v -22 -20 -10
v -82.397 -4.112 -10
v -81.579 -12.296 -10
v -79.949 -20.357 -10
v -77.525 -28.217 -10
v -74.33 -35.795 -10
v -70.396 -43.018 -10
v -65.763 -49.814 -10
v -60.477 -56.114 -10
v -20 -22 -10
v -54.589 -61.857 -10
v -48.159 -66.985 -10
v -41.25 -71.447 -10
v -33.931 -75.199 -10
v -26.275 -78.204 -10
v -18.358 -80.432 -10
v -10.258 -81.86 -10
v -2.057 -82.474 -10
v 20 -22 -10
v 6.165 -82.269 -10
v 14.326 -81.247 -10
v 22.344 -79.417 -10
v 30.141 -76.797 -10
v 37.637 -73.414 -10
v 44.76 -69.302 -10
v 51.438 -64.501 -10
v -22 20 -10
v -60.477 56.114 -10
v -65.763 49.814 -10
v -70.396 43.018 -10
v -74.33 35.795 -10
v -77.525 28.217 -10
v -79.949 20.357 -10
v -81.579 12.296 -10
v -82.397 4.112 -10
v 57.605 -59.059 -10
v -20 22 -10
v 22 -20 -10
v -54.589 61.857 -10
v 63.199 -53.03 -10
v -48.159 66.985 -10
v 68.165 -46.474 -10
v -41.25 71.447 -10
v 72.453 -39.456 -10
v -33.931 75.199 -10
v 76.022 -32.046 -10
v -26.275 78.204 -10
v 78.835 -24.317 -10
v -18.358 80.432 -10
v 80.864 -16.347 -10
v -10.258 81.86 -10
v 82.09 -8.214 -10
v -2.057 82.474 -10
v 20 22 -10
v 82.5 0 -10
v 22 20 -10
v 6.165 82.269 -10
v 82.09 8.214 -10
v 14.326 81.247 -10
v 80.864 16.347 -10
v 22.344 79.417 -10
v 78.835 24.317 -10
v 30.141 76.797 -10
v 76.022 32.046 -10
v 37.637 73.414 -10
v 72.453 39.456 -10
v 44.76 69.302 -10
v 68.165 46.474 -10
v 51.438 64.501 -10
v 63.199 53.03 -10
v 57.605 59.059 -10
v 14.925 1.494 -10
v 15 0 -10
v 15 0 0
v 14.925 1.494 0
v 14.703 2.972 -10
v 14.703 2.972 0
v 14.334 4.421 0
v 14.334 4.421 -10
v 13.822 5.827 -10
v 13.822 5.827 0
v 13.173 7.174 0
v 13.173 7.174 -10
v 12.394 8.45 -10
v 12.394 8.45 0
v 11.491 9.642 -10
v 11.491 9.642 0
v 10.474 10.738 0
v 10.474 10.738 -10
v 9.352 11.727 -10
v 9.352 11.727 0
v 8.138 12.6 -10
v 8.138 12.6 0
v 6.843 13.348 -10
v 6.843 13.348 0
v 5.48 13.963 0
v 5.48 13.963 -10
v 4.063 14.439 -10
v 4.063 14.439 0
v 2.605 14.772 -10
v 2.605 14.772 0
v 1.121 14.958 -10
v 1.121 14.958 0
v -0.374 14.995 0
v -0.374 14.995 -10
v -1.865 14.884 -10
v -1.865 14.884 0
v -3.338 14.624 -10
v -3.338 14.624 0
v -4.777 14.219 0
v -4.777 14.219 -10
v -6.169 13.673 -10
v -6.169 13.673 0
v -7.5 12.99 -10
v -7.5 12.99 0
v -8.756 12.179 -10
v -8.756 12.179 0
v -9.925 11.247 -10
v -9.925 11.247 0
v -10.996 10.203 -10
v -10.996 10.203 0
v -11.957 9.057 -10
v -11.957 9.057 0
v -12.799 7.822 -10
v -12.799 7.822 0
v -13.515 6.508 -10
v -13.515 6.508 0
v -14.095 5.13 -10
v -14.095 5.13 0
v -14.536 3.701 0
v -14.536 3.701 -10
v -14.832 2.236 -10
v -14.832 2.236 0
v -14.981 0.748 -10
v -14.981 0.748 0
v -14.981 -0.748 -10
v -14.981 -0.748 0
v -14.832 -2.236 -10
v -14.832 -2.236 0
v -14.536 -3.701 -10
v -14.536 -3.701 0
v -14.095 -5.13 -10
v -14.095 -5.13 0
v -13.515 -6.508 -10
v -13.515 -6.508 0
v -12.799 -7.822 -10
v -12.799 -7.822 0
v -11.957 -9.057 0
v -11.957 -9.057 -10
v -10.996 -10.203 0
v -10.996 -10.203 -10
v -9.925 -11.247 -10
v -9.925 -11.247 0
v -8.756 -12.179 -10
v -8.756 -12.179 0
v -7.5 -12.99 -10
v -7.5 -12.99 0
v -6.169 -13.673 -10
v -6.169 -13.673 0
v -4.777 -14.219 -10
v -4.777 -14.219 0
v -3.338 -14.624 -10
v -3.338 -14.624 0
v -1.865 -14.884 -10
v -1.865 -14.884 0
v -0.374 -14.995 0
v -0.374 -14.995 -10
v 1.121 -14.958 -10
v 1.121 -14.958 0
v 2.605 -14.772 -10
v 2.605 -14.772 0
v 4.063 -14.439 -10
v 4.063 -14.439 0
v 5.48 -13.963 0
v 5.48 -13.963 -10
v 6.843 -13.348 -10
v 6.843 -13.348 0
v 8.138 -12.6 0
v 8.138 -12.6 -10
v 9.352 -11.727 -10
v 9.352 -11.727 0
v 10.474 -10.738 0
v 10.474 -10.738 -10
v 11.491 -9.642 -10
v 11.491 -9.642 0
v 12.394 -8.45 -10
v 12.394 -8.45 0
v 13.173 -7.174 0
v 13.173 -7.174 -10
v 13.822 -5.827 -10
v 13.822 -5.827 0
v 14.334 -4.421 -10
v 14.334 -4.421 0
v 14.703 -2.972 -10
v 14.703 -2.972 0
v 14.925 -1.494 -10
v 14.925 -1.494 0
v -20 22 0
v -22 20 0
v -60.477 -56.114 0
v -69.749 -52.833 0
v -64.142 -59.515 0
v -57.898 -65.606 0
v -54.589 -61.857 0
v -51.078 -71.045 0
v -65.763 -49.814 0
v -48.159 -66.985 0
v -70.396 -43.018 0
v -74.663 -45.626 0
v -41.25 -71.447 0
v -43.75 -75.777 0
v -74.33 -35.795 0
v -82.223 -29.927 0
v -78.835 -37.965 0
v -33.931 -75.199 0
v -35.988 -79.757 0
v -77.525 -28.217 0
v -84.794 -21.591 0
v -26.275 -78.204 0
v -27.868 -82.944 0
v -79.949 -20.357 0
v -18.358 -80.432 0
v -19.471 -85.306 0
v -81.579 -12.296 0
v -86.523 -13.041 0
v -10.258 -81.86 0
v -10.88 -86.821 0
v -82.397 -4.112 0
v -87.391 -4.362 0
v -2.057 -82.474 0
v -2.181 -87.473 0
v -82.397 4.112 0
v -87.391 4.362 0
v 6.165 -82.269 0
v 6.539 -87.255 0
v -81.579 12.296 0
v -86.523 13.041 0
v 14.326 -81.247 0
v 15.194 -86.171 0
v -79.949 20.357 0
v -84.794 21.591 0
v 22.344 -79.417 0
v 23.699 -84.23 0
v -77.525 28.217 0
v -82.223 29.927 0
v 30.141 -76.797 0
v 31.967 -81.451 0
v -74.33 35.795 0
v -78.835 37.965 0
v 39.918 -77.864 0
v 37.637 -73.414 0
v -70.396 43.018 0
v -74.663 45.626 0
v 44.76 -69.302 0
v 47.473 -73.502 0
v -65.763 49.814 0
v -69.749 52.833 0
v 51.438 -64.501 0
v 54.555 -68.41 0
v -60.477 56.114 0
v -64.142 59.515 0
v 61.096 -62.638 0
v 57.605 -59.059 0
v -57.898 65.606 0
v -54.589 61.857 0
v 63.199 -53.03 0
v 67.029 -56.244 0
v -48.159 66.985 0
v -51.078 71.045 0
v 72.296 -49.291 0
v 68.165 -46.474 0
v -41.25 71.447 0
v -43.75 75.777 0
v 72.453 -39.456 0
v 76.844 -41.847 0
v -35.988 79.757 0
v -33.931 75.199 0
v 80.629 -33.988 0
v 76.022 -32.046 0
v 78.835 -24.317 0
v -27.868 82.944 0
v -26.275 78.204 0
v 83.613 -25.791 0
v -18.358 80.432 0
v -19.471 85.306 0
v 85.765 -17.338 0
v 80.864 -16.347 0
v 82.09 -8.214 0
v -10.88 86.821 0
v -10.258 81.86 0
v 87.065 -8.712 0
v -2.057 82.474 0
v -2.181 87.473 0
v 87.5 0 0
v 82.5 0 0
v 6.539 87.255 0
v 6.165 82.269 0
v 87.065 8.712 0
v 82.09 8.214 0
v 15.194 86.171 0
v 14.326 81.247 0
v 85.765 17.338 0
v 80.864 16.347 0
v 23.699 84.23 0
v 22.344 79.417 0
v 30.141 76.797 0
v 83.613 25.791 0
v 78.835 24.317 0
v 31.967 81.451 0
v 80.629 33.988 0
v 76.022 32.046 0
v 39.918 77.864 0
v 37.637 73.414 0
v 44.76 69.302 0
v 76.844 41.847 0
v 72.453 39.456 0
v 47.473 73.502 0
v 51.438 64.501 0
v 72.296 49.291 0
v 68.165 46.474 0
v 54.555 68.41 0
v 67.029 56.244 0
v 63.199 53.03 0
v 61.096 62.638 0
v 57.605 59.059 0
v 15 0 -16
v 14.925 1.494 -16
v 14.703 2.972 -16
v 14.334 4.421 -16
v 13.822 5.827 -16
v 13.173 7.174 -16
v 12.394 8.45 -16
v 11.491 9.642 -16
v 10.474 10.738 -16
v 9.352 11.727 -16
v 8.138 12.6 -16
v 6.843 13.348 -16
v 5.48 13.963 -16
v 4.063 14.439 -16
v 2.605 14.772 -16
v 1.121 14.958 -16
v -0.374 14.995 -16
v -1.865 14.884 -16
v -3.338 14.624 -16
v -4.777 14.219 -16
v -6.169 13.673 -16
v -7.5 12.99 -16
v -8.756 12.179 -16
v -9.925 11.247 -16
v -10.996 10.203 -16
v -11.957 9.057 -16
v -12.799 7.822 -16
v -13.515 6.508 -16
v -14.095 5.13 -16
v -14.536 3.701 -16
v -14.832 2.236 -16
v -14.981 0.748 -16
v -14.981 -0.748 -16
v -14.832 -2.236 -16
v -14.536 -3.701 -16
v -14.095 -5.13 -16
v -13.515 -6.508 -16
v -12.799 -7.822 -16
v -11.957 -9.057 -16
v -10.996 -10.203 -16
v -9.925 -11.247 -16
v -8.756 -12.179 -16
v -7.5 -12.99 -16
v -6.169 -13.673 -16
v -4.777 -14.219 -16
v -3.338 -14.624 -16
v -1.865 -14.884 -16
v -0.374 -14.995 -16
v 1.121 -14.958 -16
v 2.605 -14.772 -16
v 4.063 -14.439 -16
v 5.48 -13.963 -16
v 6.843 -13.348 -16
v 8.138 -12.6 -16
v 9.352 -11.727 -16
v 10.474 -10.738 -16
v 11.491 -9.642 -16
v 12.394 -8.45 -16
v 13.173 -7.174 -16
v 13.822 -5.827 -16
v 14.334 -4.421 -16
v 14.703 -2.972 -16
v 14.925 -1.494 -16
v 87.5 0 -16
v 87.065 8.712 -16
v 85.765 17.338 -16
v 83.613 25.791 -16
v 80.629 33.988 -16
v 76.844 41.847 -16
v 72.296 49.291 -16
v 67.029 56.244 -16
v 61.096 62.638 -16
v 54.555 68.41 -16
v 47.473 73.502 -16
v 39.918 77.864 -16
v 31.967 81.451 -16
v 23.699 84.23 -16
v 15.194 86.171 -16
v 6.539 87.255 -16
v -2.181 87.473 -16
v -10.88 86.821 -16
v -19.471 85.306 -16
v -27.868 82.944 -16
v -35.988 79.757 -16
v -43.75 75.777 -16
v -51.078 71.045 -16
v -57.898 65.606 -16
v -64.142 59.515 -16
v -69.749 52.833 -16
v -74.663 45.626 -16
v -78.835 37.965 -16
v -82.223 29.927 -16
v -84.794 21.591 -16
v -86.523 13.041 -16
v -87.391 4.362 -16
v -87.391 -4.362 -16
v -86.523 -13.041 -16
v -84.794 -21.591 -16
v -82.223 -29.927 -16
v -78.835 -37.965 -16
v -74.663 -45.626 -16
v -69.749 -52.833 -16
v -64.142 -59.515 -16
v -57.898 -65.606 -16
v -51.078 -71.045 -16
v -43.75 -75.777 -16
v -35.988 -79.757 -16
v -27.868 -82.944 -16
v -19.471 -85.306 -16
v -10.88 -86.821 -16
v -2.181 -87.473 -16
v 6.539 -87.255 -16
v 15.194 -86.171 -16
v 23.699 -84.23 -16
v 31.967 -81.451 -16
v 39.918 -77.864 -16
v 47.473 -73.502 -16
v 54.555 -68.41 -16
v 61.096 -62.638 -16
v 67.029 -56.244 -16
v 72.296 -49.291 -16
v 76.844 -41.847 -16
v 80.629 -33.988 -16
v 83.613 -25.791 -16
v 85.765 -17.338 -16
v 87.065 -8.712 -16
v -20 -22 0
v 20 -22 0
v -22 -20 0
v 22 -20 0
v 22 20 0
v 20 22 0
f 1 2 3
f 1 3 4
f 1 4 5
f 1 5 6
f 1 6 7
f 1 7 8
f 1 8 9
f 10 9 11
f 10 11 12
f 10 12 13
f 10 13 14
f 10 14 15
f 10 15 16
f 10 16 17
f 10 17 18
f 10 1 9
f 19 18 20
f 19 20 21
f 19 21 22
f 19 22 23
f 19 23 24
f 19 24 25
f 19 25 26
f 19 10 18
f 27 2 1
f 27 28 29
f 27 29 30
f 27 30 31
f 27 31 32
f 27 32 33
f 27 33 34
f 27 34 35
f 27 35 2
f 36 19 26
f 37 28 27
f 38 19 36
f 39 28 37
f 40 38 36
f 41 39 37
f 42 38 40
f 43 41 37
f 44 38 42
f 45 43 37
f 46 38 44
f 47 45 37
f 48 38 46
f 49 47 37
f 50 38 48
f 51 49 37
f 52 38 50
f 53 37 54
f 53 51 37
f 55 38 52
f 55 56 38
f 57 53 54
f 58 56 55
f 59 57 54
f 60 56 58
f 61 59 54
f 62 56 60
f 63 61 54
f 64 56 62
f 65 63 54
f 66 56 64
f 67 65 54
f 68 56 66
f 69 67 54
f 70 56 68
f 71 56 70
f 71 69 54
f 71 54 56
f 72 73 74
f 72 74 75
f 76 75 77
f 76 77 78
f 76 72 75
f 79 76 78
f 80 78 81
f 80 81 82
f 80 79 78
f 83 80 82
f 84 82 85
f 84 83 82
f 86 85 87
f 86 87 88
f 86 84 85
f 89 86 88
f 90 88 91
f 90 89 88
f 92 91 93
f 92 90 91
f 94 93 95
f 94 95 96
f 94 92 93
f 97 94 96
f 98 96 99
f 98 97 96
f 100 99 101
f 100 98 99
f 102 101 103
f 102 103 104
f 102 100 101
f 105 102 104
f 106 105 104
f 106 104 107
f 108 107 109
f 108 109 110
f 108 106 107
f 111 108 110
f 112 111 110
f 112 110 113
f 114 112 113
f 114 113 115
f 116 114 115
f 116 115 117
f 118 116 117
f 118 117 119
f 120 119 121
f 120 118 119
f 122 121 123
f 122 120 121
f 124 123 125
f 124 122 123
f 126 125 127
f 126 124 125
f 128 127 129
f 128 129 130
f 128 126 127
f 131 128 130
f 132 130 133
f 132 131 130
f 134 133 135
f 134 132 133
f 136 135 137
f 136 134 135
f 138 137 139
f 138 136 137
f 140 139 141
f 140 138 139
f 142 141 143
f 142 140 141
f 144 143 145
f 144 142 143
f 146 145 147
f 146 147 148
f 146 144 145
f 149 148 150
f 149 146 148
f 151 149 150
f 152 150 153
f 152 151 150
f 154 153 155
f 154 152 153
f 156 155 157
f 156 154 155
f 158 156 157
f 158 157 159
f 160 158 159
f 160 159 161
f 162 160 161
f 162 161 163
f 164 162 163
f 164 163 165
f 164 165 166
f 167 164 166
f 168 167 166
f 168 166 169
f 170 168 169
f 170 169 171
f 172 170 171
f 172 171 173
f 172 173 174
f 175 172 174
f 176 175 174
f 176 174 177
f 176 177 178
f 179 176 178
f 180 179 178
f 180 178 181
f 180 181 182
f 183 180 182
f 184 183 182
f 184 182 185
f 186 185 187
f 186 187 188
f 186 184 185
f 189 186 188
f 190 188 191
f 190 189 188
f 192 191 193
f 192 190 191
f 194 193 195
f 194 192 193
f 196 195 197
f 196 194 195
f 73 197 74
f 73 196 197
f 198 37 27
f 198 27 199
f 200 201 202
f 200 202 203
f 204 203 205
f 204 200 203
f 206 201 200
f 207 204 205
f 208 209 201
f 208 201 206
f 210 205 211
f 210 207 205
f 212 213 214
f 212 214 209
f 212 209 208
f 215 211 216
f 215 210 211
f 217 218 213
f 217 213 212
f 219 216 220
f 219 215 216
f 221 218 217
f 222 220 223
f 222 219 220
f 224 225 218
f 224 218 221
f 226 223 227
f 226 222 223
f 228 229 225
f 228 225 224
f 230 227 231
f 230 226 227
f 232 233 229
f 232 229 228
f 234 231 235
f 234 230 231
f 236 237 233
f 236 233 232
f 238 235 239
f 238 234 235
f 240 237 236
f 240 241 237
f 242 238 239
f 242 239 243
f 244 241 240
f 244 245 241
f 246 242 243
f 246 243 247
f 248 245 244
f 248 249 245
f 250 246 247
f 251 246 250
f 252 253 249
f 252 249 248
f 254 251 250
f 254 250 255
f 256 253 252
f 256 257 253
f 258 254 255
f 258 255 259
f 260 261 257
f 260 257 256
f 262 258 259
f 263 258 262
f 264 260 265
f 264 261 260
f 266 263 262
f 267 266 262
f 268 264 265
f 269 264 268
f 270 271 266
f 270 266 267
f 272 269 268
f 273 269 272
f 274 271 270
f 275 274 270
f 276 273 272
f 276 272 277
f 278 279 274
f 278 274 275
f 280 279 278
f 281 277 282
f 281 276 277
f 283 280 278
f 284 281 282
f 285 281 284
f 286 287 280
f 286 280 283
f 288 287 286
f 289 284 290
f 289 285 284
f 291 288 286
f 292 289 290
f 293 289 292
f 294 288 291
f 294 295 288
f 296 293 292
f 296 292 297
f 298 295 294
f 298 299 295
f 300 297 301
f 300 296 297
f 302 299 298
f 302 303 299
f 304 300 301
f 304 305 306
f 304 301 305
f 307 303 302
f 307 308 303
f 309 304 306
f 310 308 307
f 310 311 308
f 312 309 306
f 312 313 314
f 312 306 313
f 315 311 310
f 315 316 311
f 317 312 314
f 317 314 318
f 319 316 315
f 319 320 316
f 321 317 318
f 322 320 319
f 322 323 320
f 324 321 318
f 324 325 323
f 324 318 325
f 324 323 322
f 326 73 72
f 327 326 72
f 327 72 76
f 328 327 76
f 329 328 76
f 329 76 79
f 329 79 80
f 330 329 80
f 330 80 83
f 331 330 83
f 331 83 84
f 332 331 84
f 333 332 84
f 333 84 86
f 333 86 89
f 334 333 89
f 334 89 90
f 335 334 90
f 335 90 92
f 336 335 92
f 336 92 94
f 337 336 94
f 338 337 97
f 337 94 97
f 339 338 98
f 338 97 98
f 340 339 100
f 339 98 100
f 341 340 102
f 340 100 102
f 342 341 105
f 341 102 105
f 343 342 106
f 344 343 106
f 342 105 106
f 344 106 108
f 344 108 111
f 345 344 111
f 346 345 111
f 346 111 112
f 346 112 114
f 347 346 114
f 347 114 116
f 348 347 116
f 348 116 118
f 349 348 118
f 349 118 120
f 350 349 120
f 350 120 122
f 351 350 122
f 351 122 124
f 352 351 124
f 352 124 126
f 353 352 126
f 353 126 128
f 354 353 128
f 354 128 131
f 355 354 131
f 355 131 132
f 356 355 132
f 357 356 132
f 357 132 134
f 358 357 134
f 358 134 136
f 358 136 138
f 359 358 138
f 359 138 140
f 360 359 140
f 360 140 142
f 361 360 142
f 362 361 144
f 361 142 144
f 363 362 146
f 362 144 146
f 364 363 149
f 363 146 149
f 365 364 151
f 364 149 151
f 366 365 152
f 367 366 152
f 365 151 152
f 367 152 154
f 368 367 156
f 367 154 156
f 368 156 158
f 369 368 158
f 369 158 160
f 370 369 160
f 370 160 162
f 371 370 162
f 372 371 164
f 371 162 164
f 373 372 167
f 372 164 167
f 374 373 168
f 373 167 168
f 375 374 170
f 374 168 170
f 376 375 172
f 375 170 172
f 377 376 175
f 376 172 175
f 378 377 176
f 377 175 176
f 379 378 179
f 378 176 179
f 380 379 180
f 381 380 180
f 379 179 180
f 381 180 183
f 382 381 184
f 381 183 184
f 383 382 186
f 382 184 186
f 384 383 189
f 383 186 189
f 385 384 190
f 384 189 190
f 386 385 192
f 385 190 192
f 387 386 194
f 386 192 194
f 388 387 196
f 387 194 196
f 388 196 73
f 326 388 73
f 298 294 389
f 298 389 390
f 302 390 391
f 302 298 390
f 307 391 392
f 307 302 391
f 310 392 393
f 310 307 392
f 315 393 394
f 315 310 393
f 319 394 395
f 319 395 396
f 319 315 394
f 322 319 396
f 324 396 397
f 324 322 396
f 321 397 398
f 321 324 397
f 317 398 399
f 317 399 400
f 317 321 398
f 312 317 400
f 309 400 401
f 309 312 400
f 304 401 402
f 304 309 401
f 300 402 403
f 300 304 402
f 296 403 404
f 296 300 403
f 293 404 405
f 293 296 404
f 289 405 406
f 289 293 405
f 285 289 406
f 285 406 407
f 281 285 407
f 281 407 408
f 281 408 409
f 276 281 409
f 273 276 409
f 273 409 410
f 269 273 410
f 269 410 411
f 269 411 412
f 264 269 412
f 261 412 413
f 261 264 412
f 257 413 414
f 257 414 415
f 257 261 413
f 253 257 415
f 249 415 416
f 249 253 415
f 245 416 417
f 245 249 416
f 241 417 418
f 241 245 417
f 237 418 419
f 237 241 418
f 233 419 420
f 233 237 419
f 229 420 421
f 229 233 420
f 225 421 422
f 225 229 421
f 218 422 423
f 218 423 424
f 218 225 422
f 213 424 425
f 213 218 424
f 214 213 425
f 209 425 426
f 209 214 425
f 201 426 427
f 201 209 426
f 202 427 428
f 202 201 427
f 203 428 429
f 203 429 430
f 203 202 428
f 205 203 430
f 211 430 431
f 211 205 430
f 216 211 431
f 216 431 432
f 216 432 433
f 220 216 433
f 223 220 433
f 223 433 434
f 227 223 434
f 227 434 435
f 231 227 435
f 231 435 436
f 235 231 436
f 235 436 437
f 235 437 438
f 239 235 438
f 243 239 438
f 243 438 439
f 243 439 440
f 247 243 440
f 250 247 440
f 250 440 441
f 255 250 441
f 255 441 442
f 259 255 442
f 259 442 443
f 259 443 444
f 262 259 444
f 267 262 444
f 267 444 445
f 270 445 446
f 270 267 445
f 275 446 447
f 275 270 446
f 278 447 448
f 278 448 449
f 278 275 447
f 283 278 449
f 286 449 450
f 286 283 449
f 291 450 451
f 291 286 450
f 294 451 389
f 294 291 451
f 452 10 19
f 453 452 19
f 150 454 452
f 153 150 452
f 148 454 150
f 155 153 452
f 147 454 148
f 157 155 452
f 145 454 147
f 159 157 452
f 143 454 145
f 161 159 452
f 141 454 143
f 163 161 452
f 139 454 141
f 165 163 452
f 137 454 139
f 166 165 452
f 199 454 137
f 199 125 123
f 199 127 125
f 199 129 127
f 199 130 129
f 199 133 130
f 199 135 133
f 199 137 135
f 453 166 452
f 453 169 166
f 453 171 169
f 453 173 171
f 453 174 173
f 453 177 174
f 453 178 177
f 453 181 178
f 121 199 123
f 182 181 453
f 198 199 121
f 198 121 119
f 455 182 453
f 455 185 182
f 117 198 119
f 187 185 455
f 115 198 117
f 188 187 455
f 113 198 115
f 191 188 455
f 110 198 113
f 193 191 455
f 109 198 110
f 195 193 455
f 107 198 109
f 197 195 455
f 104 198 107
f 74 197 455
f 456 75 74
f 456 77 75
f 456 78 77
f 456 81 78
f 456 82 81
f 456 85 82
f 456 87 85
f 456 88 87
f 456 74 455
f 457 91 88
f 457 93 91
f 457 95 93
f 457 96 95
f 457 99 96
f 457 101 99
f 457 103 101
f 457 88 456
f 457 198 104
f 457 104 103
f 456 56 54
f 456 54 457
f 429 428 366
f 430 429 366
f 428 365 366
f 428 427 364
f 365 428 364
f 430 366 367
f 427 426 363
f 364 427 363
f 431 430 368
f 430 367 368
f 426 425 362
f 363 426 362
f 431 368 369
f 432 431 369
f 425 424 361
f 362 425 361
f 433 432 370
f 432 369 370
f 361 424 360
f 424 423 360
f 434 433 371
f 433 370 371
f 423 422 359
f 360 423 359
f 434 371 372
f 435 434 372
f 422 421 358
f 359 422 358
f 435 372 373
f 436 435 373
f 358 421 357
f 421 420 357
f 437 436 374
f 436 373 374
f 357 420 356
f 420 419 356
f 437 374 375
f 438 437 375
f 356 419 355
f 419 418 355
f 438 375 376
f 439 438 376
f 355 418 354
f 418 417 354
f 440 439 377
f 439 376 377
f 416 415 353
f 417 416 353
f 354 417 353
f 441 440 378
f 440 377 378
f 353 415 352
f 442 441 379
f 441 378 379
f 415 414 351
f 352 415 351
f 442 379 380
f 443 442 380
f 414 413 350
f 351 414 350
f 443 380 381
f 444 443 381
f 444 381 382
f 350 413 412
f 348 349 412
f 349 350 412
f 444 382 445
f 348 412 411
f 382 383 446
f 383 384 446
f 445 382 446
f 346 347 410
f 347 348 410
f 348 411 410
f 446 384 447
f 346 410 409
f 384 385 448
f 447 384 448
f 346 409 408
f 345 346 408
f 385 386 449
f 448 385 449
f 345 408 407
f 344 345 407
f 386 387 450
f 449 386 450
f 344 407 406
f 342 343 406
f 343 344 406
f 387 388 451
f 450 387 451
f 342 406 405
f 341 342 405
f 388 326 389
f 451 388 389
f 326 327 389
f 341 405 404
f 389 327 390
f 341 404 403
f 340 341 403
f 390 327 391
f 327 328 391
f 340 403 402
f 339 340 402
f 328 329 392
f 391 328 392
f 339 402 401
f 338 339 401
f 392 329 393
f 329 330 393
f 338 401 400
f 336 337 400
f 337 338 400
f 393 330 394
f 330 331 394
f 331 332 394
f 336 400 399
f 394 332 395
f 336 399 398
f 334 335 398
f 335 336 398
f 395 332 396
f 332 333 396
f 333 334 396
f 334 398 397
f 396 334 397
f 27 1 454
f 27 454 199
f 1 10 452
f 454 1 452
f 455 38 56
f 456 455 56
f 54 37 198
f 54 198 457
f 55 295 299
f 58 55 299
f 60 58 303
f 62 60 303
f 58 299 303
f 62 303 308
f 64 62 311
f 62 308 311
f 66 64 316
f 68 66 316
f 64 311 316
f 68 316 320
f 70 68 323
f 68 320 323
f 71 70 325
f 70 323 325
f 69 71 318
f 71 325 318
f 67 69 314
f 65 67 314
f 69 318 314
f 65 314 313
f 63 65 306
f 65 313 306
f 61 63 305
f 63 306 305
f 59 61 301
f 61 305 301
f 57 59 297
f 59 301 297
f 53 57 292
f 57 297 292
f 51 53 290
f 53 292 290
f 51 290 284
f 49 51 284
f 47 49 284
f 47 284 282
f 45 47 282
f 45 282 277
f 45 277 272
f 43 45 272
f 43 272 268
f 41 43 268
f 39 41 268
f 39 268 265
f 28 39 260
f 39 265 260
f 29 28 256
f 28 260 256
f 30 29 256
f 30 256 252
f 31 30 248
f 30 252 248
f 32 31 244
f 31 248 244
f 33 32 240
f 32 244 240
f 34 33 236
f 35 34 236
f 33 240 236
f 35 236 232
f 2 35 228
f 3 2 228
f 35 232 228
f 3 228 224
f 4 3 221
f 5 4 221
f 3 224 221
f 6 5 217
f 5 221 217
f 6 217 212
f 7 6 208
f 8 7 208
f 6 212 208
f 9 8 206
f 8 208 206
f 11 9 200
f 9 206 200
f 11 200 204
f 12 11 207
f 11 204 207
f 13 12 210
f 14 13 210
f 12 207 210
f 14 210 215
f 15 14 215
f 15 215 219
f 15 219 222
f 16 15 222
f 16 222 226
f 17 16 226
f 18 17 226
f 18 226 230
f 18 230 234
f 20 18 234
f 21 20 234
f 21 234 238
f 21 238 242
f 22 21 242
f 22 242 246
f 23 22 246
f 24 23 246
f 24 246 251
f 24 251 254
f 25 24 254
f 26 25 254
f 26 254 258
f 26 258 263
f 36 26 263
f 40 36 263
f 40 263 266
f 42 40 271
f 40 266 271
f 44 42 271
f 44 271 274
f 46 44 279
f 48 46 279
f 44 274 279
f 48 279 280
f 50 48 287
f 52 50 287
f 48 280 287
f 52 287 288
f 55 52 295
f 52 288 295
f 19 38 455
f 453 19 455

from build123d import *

# Parameters (mm, degrees)
F0_R     = 87.5
F0_R_2   = 82.5
F0_R_3   = 15
F1_DEPTH = 16
F2_DEPTH = 10
F3_W     = 44
F3_H     = 44
F3_R     = 15
F4_DEPTH = 10
F5_SIZE  = 2


with BuildPart() as f1:
    # F0 (on Top) → F1 (new body)
    with BuildSketch(Plane.XY):
        Circle(F0_R)
        Circle(F0_R_2, mode=Mode.SUBTRACT)
        Circle(F0_R_2)
        Circle(F0_R_3, mode=Mode.SUBTRACT)
    extrude(amount=-F1_DEPTH)

    # F0 (on Top) → F2 (cut)
    with BuildSketch(Plane.XY):
        Circle(F0_R_2)
        Circle(F0_R_3, mode=Mode.SUBTRACT)
    extrude(amount=-F2_DEPTH, mode=Mode.SUBTRACT)

    # F3 (on face) → F4 (join)
    with BuildSketch(Plane.XY.offset(-10)):
        Rectangle(F3_W, F3_H)
        Circle(F3_R, mode=Mode.SUBTRACT)
    extrude(amount=F4_DEPTH)

    # F5
    f5_edges = [f1.edges().sort_by_distance(p)[0] for p in [
        (22, -22, -5),
        (-22, -22, -5),
        (22, 22, -5),
        (-22, 22, -5),
    ]]
    chamfer(f5_edges, length=F5_SIZE)


solid = f1.part
